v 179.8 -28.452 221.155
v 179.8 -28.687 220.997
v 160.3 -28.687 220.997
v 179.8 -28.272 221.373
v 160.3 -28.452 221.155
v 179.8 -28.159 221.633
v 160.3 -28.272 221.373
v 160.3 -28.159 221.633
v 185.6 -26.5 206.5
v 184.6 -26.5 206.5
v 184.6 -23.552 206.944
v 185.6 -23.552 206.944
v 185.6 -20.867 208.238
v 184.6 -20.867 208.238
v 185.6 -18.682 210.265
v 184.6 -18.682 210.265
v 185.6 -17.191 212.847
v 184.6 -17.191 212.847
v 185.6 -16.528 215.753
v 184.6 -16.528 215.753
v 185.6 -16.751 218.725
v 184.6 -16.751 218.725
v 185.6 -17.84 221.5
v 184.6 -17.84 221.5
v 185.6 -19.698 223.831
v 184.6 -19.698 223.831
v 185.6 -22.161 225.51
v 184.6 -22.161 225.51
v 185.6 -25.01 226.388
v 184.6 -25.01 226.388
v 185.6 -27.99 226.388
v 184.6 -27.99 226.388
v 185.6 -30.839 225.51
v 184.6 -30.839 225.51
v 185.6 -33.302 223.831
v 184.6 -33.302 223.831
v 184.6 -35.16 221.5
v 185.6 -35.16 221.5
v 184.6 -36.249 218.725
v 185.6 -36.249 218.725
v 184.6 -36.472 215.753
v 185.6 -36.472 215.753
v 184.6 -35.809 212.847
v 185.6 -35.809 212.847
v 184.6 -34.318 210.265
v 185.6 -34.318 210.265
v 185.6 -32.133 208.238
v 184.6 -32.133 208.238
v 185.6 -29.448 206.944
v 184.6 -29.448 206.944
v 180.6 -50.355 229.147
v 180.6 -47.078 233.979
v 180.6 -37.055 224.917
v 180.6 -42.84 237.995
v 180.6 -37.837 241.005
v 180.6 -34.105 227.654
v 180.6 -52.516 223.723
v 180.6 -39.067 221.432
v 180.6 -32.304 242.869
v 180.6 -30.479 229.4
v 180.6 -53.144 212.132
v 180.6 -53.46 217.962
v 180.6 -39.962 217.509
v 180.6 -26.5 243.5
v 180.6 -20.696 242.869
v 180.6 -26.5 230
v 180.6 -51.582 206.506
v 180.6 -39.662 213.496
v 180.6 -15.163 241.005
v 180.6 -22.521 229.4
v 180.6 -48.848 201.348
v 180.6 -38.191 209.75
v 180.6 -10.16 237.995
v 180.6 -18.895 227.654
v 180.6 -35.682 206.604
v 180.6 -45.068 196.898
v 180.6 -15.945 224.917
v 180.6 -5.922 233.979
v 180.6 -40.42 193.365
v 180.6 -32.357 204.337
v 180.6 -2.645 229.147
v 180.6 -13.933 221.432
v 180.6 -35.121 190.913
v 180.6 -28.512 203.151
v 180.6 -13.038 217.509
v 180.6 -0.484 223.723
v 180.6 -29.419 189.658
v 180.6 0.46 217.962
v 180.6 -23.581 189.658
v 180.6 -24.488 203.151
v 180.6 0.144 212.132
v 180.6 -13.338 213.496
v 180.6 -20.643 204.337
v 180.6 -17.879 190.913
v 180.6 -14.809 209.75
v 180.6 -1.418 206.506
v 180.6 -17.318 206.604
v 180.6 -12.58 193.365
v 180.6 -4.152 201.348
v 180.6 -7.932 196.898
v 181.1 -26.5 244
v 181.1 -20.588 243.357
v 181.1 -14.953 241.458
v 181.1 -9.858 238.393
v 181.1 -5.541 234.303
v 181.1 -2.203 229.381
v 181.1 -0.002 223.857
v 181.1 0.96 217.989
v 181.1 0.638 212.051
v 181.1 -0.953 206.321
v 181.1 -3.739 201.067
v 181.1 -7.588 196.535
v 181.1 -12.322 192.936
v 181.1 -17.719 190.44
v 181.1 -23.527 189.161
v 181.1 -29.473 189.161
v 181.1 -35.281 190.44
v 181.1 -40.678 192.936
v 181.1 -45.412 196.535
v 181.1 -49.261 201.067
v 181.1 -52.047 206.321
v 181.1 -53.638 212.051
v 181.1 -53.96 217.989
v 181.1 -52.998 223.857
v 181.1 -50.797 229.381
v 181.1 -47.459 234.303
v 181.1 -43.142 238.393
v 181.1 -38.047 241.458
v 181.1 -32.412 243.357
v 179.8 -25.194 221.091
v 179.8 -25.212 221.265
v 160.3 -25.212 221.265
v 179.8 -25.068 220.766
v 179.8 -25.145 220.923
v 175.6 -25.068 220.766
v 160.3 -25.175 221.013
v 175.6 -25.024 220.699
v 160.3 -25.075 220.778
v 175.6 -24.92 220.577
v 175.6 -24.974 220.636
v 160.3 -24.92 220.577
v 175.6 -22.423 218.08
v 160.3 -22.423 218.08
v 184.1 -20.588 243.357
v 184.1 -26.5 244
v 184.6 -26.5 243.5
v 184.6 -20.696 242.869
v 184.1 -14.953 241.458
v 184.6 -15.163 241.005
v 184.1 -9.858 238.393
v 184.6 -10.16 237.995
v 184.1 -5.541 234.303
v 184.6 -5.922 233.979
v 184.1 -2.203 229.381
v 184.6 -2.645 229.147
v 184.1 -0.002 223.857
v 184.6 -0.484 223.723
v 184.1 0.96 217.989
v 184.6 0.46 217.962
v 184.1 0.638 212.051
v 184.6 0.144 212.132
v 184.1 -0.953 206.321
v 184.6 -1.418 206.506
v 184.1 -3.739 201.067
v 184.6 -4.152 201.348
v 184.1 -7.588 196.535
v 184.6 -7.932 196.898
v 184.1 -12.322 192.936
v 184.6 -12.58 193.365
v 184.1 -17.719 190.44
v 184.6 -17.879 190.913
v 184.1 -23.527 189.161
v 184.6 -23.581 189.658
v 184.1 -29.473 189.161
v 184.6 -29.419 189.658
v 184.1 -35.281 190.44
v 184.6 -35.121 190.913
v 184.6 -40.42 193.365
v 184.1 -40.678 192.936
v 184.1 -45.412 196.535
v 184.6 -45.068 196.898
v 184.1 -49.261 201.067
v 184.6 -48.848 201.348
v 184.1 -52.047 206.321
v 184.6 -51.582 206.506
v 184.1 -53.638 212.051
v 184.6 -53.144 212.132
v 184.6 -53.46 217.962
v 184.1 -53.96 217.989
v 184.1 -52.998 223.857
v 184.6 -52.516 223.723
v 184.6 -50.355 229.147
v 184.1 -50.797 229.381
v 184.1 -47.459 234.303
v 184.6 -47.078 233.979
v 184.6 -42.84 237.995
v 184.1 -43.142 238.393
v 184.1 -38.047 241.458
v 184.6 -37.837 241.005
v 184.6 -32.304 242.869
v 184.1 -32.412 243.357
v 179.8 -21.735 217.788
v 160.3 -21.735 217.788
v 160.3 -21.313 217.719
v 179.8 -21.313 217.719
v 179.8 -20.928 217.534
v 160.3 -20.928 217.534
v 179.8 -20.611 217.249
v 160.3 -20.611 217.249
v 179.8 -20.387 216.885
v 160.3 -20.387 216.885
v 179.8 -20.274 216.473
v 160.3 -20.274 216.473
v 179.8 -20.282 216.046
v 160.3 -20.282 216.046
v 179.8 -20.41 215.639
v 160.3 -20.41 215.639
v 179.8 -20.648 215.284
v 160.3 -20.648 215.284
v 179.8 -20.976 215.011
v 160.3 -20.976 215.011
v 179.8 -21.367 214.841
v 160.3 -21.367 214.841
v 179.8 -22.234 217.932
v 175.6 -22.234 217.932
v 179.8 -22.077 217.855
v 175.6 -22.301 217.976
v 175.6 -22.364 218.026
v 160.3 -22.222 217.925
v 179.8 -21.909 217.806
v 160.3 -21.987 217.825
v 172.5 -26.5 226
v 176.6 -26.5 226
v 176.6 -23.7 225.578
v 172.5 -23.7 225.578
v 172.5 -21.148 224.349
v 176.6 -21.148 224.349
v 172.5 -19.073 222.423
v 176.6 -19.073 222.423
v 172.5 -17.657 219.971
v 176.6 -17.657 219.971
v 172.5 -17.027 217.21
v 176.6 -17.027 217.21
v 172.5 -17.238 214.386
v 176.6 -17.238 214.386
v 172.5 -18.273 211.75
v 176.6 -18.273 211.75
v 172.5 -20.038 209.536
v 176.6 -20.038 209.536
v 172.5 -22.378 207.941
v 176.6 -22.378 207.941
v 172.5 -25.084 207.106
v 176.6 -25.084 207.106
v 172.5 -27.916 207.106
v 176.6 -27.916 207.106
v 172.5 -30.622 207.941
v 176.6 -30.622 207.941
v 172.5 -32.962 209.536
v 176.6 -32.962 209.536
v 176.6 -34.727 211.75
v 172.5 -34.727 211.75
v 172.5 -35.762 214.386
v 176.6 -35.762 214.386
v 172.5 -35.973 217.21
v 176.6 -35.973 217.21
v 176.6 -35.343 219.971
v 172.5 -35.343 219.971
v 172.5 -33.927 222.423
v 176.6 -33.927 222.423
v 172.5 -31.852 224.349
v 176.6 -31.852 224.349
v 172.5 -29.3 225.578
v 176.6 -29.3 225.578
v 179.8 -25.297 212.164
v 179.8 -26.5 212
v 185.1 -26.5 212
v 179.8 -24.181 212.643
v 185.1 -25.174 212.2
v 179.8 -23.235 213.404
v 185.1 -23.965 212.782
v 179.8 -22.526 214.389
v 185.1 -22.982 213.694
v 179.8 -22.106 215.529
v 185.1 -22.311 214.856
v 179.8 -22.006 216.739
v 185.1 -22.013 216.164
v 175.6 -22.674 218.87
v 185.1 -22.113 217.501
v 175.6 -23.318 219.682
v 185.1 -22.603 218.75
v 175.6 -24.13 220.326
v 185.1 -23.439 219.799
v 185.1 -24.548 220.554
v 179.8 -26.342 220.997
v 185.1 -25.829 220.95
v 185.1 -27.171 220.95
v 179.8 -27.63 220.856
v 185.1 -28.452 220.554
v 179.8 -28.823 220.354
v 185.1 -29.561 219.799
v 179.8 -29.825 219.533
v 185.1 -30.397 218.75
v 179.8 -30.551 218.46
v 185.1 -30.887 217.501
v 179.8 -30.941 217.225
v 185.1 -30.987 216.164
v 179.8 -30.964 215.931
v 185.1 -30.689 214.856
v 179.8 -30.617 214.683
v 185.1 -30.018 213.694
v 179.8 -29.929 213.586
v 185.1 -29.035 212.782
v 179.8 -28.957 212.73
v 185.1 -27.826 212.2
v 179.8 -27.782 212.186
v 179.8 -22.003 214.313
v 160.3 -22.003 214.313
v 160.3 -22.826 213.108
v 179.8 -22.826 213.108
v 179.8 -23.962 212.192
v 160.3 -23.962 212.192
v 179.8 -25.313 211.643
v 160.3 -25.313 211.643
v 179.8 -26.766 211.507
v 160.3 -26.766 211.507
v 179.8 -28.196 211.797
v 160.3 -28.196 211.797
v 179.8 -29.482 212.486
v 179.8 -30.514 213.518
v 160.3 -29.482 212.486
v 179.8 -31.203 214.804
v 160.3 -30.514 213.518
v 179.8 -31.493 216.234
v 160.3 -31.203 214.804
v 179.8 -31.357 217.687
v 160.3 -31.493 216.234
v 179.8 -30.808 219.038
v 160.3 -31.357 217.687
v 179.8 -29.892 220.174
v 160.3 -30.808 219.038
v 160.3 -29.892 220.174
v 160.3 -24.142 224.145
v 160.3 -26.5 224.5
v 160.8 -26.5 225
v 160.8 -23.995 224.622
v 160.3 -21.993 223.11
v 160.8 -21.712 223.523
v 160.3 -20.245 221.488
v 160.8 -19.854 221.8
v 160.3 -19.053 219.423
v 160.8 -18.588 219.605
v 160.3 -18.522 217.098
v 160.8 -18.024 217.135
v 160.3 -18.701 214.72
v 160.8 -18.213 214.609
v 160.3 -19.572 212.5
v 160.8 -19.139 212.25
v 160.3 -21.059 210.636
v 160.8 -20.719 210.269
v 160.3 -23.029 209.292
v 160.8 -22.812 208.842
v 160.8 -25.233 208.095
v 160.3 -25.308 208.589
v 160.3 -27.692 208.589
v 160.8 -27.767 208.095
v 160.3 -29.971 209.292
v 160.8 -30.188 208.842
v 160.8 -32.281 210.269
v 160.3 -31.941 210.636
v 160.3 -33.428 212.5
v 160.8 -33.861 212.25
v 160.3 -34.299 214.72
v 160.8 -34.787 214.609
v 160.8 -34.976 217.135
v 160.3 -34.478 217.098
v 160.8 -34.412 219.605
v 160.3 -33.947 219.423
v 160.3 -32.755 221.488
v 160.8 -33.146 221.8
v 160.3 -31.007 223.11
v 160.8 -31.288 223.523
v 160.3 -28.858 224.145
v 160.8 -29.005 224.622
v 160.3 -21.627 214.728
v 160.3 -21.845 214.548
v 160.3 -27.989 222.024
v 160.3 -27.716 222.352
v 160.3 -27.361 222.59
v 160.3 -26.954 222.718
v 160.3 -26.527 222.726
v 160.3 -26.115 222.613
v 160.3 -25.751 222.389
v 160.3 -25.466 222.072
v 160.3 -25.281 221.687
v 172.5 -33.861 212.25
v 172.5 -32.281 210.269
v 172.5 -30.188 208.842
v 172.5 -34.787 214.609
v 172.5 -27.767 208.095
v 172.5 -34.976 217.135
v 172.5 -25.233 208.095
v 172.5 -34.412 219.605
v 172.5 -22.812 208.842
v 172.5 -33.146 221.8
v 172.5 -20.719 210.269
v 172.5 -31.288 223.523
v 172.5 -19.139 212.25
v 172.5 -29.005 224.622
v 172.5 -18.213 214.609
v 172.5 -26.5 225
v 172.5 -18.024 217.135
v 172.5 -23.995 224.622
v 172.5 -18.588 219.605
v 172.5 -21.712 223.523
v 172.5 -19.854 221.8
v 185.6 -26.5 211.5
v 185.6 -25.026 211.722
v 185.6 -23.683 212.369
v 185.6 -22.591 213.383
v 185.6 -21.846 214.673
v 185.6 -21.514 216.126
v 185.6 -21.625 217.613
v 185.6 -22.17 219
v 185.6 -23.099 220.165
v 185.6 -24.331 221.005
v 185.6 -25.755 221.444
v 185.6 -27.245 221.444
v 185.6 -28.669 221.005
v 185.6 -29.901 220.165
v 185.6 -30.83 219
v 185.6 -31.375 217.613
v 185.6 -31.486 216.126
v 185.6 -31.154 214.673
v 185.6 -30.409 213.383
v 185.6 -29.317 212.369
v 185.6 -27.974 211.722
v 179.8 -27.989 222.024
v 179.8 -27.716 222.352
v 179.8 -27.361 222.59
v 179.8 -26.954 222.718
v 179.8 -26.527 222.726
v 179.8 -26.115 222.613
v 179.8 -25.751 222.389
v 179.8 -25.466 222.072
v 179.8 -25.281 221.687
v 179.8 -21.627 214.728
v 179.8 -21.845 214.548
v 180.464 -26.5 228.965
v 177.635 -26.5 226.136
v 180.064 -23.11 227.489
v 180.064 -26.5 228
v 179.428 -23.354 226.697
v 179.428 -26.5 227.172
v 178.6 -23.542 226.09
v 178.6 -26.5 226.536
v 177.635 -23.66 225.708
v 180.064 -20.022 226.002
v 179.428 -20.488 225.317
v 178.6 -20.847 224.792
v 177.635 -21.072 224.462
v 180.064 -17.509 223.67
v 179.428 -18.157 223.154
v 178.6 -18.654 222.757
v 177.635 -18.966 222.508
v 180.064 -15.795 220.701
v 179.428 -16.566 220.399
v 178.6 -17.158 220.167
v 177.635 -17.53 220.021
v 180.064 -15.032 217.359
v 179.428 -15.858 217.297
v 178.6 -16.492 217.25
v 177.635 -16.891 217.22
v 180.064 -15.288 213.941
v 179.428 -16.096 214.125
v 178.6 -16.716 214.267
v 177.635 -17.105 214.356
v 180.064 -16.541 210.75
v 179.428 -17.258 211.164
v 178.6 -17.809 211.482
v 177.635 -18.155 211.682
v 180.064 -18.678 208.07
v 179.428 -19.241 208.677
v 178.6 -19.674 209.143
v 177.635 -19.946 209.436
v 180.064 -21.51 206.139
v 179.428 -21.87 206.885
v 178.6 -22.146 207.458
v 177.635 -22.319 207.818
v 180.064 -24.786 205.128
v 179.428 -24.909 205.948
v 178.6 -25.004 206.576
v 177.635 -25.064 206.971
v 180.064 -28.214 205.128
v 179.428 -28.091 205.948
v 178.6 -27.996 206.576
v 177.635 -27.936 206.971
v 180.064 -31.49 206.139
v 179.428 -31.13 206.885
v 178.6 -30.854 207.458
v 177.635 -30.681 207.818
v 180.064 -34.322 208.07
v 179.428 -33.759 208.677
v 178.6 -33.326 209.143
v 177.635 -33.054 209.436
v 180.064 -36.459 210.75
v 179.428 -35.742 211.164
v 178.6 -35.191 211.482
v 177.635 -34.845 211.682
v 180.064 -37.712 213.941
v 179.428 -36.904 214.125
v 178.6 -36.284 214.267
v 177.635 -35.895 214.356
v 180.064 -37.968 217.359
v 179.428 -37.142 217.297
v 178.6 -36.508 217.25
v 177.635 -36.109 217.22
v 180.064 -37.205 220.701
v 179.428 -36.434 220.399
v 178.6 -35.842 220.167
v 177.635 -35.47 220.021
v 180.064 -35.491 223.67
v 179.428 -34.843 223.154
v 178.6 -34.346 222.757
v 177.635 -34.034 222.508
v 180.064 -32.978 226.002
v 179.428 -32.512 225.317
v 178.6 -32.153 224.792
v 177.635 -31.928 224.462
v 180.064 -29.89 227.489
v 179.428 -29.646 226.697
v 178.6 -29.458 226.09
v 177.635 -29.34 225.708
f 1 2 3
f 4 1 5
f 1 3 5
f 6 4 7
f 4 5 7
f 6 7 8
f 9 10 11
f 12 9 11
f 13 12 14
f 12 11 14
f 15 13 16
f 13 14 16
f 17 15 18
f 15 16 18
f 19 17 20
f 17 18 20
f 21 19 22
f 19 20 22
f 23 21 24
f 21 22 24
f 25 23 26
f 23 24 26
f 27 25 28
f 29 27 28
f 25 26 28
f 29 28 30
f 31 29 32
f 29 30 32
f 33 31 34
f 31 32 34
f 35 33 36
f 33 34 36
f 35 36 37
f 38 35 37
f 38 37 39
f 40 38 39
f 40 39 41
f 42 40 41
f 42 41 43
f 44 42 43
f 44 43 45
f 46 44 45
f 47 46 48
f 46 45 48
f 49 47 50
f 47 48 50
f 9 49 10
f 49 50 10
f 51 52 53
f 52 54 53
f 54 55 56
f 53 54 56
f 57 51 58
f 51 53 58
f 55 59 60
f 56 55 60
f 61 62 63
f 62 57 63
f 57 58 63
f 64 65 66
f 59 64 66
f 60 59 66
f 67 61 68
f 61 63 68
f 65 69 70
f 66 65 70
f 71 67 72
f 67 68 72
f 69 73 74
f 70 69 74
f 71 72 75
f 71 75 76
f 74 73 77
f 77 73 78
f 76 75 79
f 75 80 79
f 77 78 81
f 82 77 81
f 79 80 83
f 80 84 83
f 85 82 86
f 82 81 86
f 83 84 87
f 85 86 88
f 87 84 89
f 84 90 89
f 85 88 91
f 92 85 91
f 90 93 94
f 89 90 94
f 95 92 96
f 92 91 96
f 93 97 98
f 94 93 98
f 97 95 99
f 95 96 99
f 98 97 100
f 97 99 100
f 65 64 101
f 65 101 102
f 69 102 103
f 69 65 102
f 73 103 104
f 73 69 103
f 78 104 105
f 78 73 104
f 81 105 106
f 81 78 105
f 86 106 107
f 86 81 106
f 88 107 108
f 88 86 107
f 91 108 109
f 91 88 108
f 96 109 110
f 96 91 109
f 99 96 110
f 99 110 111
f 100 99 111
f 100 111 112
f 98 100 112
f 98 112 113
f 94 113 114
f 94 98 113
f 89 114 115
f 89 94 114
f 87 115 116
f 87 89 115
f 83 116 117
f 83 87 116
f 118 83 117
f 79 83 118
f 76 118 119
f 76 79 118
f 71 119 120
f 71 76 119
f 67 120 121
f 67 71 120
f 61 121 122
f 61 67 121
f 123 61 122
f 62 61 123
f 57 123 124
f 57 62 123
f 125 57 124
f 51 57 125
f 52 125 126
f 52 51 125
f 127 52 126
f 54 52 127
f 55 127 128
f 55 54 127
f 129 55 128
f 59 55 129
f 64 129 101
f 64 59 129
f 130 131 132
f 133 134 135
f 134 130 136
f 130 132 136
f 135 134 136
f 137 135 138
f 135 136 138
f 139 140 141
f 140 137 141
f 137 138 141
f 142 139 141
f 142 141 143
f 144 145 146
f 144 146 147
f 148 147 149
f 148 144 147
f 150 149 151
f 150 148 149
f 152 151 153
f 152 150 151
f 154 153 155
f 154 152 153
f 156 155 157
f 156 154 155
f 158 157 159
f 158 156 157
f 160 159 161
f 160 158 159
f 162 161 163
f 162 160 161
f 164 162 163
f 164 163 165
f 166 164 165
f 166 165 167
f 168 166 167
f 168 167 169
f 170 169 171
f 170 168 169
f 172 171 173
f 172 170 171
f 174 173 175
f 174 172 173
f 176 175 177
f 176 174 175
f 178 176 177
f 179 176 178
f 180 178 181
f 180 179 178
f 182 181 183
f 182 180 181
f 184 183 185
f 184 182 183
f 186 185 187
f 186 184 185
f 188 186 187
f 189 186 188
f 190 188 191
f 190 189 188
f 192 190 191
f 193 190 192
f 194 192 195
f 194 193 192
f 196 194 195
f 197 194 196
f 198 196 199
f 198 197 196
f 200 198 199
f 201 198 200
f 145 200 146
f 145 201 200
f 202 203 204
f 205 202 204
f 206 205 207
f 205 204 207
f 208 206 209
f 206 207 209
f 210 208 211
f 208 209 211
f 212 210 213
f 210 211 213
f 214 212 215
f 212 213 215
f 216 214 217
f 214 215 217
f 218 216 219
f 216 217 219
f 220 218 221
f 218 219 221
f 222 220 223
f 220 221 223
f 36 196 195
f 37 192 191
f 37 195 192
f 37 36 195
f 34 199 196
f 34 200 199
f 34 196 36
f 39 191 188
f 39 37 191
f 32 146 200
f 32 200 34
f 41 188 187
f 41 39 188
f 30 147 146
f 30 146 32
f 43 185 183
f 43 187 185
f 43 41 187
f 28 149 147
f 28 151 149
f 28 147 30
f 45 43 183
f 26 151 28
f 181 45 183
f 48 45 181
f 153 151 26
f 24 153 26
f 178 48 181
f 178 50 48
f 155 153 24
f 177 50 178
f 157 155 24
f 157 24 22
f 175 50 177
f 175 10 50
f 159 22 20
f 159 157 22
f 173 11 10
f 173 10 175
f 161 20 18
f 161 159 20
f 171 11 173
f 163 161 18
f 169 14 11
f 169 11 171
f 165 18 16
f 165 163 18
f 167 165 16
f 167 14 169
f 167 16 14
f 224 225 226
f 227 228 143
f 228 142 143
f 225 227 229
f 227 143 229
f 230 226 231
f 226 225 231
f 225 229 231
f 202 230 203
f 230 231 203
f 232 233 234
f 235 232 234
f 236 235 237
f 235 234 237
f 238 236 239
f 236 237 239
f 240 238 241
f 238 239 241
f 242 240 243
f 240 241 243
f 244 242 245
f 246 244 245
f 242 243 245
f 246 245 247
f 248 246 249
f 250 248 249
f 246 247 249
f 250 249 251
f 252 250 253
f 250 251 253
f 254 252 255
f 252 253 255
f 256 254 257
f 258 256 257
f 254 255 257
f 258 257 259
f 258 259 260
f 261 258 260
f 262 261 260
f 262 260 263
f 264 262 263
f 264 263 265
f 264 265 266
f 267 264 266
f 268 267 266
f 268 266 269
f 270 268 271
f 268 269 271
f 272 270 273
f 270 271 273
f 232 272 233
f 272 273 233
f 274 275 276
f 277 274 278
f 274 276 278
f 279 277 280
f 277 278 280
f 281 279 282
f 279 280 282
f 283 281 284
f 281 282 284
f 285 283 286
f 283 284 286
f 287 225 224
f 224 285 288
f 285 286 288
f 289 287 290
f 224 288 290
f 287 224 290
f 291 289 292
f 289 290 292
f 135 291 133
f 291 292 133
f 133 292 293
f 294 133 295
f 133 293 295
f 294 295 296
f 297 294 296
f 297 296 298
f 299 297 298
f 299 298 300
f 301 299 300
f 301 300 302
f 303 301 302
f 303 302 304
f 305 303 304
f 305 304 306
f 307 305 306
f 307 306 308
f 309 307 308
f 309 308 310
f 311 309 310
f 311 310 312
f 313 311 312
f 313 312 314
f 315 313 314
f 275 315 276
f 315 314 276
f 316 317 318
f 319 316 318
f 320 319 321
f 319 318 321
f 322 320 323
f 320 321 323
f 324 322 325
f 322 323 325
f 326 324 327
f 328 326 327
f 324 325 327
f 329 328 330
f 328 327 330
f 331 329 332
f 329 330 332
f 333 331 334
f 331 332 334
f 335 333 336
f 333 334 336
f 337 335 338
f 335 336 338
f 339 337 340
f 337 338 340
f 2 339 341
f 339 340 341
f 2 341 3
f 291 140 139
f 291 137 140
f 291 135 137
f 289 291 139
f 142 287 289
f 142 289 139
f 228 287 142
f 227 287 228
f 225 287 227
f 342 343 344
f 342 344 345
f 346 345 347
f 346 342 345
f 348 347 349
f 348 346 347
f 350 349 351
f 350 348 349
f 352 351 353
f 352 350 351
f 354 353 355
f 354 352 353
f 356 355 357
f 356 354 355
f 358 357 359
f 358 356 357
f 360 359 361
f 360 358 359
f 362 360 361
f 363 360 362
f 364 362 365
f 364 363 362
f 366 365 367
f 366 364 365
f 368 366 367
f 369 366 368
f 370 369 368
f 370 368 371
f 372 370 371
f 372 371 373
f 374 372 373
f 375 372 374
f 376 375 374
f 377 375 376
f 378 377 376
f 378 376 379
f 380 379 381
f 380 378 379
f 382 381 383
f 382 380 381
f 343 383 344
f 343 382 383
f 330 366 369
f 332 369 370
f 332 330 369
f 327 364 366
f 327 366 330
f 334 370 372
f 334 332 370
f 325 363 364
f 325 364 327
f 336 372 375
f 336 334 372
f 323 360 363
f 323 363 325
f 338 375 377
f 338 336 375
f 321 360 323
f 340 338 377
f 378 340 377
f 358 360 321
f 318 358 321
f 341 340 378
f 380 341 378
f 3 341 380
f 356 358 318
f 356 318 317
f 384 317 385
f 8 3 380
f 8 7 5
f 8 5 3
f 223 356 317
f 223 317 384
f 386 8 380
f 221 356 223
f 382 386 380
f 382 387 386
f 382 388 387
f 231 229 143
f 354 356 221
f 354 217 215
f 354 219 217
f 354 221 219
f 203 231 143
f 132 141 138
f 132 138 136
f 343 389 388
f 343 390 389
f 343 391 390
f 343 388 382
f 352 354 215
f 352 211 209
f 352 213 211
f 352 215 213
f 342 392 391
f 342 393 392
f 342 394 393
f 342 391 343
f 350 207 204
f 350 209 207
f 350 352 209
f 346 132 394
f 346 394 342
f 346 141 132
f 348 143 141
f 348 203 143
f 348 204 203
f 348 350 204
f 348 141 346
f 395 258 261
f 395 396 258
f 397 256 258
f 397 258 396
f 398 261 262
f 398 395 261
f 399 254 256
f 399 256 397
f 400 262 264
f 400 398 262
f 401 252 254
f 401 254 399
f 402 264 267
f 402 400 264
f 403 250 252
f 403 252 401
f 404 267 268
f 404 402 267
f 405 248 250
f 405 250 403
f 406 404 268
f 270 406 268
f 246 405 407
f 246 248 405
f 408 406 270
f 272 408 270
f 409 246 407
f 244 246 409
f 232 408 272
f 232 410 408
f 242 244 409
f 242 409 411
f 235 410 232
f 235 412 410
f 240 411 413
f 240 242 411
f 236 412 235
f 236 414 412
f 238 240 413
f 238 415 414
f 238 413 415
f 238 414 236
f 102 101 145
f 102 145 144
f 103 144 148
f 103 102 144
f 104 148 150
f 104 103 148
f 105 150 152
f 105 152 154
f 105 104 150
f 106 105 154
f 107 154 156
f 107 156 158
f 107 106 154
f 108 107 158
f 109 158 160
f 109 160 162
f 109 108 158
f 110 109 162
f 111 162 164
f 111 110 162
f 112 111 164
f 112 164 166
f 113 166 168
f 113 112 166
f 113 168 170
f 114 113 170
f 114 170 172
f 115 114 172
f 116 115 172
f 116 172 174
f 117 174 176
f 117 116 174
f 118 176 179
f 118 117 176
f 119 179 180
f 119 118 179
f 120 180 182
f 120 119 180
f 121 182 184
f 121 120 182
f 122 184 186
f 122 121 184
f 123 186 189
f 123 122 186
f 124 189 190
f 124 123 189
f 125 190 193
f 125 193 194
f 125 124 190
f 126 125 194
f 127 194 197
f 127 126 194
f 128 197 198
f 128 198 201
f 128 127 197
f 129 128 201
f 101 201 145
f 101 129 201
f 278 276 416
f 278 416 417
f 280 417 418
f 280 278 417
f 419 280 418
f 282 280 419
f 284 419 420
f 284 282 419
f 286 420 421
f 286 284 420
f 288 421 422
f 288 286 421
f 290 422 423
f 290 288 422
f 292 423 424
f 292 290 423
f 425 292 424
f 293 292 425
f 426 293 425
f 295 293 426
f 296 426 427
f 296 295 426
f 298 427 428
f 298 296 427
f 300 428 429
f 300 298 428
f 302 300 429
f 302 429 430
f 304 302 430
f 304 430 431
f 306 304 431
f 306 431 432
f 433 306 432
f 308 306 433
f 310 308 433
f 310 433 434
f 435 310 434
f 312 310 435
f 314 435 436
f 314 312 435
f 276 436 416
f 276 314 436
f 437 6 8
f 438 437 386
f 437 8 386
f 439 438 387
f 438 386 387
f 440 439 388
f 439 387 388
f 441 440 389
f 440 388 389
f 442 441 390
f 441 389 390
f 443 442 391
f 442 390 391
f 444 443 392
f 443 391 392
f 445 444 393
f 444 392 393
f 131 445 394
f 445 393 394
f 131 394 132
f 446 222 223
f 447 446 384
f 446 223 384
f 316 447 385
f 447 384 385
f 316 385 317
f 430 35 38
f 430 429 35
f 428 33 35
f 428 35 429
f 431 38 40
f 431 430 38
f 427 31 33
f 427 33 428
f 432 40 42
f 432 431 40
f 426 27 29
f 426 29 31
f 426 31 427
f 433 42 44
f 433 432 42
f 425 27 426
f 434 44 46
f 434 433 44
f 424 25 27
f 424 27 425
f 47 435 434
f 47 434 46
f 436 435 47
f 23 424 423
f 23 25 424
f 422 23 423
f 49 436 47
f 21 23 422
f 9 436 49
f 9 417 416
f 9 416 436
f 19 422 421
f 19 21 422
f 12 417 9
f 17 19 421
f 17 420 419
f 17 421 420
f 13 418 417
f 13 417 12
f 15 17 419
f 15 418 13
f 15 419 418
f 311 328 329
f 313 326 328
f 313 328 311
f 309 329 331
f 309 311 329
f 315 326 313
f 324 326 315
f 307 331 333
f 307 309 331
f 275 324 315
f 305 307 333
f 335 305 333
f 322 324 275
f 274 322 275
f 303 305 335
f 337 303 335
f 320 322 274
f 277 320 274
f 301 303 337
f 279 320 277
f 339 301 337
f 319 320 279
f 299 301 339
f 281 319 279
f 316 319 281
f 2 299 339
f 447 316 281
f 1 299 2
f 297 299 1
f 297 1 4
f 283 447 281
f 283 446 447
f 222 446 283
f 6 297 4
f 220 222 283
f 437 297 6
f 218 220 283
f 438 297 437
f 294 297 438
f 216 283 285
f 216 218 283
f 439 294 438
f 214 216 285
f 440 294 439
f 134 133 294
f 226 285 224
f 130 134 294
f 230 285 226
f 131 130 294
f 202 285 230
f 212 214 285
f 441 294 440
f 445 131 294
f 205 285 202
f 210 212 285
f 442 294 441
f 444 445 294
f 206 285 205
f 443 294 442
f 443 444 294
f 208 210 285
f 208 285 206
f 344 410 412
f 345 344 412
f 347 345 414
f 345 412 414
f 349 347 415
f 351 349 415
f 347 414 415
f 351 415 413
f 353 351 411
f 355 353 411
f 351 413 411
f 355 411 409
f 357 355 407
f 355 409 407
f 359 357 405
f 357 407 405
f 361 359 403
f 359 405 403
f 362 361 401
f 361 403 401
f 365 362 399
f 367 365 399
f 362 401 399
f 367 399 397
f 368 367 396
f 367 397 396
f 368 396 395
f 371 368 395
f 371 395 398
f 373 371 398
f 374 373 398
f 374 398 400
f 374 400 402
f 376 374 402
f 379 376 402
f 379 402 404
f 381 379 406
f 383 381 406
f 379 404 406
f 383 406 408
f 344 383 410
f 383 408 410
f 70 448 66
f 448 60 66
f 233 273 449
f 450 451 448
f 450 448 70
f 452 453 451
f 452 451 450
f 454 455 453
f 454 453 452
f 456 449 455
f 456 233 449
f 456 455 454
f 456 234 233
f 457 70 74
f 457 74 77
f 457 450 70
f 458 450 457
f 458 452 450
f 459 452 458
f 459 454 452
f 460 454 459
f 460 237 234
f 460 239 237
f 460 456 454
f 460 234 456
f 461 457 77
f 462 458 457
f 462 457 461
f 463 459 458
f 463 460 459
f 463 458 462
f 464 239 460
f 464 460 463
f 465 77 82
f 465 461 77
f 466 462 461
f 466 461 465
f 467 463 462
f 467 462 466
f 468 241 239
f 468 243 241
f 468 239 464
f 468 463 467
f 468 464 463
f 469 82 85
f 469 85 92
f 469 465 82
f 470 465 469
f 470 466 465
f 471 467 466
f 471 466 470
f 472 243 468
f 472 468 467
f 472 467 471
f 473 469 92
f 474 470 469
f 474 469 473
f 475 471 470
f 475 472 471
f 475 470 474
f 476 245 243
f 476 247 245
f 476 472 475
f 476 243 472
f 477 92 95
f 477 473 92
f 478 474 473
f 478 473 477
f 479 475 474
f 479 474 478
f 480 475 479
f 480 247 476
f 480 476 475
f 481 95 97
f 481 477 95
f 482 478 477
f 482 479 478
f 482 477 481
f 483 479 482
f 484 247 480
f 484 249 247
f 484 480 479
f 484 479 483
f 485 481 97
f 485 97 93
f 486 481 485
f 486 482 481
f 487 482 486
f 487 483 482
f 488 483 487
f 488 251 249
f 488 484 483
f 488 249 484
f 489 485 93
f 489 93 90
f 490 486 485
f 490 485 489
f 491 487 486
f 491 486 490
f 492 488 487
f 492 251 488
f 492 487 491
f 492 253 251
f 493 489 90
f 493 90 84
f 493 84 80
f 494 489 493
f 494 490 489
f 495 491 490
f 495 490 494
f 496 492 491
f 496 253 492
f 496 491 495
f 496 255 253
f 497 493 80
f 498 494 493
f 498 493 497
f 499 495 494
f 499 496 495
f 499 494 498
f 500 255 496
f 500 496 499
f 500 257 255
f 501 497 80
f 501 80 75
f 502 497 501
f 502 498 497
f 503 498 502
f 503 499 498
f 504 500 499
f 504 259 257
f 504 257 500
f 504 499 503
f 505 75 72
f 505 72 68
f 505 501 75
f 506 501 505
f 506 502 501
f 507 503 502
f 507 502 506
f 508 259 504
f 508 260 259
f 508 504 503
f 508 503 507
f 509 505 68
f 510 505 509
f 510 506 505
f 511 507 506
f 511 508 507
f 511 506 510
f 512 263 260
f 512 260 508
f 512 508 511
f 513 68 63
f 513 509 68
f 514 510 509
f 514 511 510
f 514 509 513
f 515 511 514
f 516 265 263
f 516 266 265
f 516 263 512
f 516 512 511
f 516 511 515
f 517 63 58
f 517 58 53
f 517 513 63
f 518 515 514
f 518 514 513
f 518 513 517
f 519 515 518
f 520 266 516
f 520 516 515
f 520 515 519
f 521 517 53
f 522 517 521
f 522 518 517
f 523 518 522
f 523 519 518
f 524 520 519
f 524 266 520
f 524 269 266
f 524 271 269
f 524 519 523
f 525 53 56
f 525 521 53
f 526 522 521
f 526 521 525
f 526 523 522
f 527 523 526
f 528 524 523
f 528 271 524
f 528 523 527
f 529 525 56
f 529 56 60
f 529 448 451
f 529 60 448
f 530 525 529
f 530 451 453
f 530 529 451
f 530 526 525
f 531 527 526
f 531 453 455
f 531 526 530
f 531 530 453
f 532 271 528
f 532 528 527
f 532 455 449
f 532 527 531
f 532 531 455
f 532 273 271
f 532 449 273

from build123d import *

# Parameters (mm, degrees)
SKETCH1_W           = 4
SKETCH1_H           = 27.5
SKETCH2_R           = 10
BOSS_EXTRUDE1_DEPTH = 1
SKETCH3_R           = 9.5
BOSS_EXTRUDE2_DEPTH = 8.1
SKETCH4_R           = 8.5
BOSS_EXTRUDE3_DEPTH = 12.2
CUT_EXTRUDE1_DEPTH  = 19.5
HOLE1_D             = 5
HOLE1_DEPTH         = 25.3
HOLE1_CBORE_D       = 9
HOLE1_CBORE_DEPTH   = 10
CHAMFER1_SIZE       = 0.5
FILLET1_R           = 1
FILLET2_R           = 4


with BuildPart() as part:
    # Sketch1 → Revolve1 (revolve)
    with BuildSketch(Plane(origin=(0, 0, 216.5), x_dir=(-1, 0, 0), z_dir=(0, 0, -1)), mode=Mode.PRIVATE) as revolve1_sk:
        with Locations((-182.6, -12.75)):
            Rectangle(SKETCH1_W, SKETCH1_H)
    revolve(revolve1_sk.sketch.rotate(Axis((184.6, -26.5, 216.5), (-1, 0, 0)), 270), axis=Axis((184.6, -26.5, 216.5), (-1, 0, 0)))

    # Sketch2 → Boss-Extrude1 (add)
    with BuildSketch(Plane(origin=(184.6, 0, 0), x_dir=(0, 0, -1), z_dir=(1, 0, 0))):
        with Locations((-216.5, -26.5)):
            Circle(SKETCH2_R)
    extrude(amount=BOSS_EXTRUDE1_DEPTH)

    # Sketch3 → Boss-Extrude2 (add)
    with BuildSketch(Plane.ZY.offset(-180.6)):
        with Locations((216.5, -26.5)):
            Circle(SKETCH3_R)
    extrude(amount=BOSS_EXTRUDE2_DEPTH)

    # Sketch4 → Boss-Extrude3 (add)
    with BuildSketch(Plane.ZY.offset(-172.5)):
        with Locations((216.5, -26.5)):
            Circle(SKETCH4_R)
    extrude(amount=BOSS_EXTRUDE3_DEPTH)

    # Sketch5 → Cut-Extrude1 (cut)
    with BuildSketch(Plane.ZY.offset(-160.3)):
        with BuildLine():
            Line((220.906082937, -25.249228687), (217.750771313, -22.093917063))
            ThreePointArc((217.750771313, -22.093917063), (216.434925146, -20.269610576), (214.788393439, -21.802085252))
            ThreePointArc((214.788393439, -21.802085252), (212.964466094, -30.035533906), (221.197914748, -28.211606561))
            ThreePointArc((221.197914748, -28.211606561), (222.730389424, -26.565074854), (220.906082937, -25.249228687))
        make_face()
    extrude(amount=-CUT_EXTRUDE1_DEPTH, mode=Mode.SUBTRACT)

    # Hole1
    with Locations(Plane(origin=(185.6, 0, 0), x_dir=(0, 0, -1), z_dir=(1, 0, 0))):
        with Locations((-216.5, -26.5)):
            CounterBoreHole(HOLE1_D / 2, HOLE1_CBORE_D / 2, HOLE1_CBORE_DEPTH, depth=HOLE1_DEPTH)

    # Chamfer1
    chamfer1_edges = [part.edges().sort_by_distance(p)[0] for p in [
        (160.3, -26.5, 208),
        (180.6, -26.5, 189),
        (185.6, -26.5, 221),
        (184.6, -26.5, 189),
    ]]
    chamfer(chamfer1_edges, length=CHAMFER1_SIZE)

    # Fillet1
    # the kernel refuses this fillet: 1 mm, written as the material it takes off along each edge
    with BuildSketch(Plane(origin=(159.134806492, -25.249228687, 220.906082937), x_dir=(0, 0.7071067811864904, -0.7071067811866047), z_dir=(1, 0, 0))) as fillet1_piece_1:
        with BuildLine():
            CenterArc((0.466077403, 1), FILLET1_R, 226.054480438, 43.945519562)
            ThreePointArc((-0.22789666, 0.28), (-0.105493762, 0.146881314), (0, 0))
            Line((0, 0), (0.466077403, 0))
        make_face()
    extrude(amount=20.665193508, mode=Mode.SUBTRACT)
    with BuildSketch(Plane(origin=(159.134806492, -22.093917063, 217.750771313), x_dir=(0, -0.7071067811865017, 0.7071067811865932), z_dir=(1, 0, 0))) as fillet1_piece_2:
        with BuildLine():
            CenterArc((0.466077403, -1), FILLET1_R, 90, 43.945519562)
            ThreePointArc((-0.22789666, -0.28), (-0.105493762, -0.146881314), (0, 0))
            Line((0, 0), (0.466077403, 0))
        make_face()
    extrude(amount=20.665193508, mode=Mode.SUBTRACT)
    with BuildSketch(Plane(origin=(159.010183368, -28.211606561, 221.197914748), x_dir=(0, -0.9206703550954229, -0.39034100123925997), z_dir=(1, 0, 0))) as fillet1_piece_3:
        with BuildLine():
            CenterArc((0.567519318, -0.998668212), FILLET1_R, 92.957354948, 48.80173568)
            ThreePointArc((-0.217895829, -0.37969887), (-0.095021383, -0.197841382), (0, 0))
            ThreePointArc((0, 0), (0.257963326, -0.006658942), (0.515926653, 0))
        make_face()
    extrude(amount=20.789816632, mode=Mode.SUBTRACT)
    with BuildSketch(Plane(origin=(159.010183368, -21.802085252, 214.788393439), x_dir=(0, -0.3903410012394471, -0.9206703550953437), z_dir=(1, 0, 0))) as fillet1_piece_4:
        with BuildLine():
            CenterArc((0.567519318, 0.998668212), FILLET1_R, 218.240909372, 48.80173568)
            ThreePointArc((-0.217895829, 0.37969887), (-0.095021383, 0.197841382), (0, 0))
            ThreePointArc((0, 0), (0.257963326, 0.006658942), (0.515926653, 0))
        make_face()
    extrude(amount=20.789816632, mode=Mode.SUBTRACT)

    # Fillet2
    fillet2_edges = [part.edges().sort_by_distance(p)[0] for p in [
        (180.6, -26.5, 207),
    ]]
    fillet(fillet2_edges, radius=FILLET2_R)


solid = part.part
